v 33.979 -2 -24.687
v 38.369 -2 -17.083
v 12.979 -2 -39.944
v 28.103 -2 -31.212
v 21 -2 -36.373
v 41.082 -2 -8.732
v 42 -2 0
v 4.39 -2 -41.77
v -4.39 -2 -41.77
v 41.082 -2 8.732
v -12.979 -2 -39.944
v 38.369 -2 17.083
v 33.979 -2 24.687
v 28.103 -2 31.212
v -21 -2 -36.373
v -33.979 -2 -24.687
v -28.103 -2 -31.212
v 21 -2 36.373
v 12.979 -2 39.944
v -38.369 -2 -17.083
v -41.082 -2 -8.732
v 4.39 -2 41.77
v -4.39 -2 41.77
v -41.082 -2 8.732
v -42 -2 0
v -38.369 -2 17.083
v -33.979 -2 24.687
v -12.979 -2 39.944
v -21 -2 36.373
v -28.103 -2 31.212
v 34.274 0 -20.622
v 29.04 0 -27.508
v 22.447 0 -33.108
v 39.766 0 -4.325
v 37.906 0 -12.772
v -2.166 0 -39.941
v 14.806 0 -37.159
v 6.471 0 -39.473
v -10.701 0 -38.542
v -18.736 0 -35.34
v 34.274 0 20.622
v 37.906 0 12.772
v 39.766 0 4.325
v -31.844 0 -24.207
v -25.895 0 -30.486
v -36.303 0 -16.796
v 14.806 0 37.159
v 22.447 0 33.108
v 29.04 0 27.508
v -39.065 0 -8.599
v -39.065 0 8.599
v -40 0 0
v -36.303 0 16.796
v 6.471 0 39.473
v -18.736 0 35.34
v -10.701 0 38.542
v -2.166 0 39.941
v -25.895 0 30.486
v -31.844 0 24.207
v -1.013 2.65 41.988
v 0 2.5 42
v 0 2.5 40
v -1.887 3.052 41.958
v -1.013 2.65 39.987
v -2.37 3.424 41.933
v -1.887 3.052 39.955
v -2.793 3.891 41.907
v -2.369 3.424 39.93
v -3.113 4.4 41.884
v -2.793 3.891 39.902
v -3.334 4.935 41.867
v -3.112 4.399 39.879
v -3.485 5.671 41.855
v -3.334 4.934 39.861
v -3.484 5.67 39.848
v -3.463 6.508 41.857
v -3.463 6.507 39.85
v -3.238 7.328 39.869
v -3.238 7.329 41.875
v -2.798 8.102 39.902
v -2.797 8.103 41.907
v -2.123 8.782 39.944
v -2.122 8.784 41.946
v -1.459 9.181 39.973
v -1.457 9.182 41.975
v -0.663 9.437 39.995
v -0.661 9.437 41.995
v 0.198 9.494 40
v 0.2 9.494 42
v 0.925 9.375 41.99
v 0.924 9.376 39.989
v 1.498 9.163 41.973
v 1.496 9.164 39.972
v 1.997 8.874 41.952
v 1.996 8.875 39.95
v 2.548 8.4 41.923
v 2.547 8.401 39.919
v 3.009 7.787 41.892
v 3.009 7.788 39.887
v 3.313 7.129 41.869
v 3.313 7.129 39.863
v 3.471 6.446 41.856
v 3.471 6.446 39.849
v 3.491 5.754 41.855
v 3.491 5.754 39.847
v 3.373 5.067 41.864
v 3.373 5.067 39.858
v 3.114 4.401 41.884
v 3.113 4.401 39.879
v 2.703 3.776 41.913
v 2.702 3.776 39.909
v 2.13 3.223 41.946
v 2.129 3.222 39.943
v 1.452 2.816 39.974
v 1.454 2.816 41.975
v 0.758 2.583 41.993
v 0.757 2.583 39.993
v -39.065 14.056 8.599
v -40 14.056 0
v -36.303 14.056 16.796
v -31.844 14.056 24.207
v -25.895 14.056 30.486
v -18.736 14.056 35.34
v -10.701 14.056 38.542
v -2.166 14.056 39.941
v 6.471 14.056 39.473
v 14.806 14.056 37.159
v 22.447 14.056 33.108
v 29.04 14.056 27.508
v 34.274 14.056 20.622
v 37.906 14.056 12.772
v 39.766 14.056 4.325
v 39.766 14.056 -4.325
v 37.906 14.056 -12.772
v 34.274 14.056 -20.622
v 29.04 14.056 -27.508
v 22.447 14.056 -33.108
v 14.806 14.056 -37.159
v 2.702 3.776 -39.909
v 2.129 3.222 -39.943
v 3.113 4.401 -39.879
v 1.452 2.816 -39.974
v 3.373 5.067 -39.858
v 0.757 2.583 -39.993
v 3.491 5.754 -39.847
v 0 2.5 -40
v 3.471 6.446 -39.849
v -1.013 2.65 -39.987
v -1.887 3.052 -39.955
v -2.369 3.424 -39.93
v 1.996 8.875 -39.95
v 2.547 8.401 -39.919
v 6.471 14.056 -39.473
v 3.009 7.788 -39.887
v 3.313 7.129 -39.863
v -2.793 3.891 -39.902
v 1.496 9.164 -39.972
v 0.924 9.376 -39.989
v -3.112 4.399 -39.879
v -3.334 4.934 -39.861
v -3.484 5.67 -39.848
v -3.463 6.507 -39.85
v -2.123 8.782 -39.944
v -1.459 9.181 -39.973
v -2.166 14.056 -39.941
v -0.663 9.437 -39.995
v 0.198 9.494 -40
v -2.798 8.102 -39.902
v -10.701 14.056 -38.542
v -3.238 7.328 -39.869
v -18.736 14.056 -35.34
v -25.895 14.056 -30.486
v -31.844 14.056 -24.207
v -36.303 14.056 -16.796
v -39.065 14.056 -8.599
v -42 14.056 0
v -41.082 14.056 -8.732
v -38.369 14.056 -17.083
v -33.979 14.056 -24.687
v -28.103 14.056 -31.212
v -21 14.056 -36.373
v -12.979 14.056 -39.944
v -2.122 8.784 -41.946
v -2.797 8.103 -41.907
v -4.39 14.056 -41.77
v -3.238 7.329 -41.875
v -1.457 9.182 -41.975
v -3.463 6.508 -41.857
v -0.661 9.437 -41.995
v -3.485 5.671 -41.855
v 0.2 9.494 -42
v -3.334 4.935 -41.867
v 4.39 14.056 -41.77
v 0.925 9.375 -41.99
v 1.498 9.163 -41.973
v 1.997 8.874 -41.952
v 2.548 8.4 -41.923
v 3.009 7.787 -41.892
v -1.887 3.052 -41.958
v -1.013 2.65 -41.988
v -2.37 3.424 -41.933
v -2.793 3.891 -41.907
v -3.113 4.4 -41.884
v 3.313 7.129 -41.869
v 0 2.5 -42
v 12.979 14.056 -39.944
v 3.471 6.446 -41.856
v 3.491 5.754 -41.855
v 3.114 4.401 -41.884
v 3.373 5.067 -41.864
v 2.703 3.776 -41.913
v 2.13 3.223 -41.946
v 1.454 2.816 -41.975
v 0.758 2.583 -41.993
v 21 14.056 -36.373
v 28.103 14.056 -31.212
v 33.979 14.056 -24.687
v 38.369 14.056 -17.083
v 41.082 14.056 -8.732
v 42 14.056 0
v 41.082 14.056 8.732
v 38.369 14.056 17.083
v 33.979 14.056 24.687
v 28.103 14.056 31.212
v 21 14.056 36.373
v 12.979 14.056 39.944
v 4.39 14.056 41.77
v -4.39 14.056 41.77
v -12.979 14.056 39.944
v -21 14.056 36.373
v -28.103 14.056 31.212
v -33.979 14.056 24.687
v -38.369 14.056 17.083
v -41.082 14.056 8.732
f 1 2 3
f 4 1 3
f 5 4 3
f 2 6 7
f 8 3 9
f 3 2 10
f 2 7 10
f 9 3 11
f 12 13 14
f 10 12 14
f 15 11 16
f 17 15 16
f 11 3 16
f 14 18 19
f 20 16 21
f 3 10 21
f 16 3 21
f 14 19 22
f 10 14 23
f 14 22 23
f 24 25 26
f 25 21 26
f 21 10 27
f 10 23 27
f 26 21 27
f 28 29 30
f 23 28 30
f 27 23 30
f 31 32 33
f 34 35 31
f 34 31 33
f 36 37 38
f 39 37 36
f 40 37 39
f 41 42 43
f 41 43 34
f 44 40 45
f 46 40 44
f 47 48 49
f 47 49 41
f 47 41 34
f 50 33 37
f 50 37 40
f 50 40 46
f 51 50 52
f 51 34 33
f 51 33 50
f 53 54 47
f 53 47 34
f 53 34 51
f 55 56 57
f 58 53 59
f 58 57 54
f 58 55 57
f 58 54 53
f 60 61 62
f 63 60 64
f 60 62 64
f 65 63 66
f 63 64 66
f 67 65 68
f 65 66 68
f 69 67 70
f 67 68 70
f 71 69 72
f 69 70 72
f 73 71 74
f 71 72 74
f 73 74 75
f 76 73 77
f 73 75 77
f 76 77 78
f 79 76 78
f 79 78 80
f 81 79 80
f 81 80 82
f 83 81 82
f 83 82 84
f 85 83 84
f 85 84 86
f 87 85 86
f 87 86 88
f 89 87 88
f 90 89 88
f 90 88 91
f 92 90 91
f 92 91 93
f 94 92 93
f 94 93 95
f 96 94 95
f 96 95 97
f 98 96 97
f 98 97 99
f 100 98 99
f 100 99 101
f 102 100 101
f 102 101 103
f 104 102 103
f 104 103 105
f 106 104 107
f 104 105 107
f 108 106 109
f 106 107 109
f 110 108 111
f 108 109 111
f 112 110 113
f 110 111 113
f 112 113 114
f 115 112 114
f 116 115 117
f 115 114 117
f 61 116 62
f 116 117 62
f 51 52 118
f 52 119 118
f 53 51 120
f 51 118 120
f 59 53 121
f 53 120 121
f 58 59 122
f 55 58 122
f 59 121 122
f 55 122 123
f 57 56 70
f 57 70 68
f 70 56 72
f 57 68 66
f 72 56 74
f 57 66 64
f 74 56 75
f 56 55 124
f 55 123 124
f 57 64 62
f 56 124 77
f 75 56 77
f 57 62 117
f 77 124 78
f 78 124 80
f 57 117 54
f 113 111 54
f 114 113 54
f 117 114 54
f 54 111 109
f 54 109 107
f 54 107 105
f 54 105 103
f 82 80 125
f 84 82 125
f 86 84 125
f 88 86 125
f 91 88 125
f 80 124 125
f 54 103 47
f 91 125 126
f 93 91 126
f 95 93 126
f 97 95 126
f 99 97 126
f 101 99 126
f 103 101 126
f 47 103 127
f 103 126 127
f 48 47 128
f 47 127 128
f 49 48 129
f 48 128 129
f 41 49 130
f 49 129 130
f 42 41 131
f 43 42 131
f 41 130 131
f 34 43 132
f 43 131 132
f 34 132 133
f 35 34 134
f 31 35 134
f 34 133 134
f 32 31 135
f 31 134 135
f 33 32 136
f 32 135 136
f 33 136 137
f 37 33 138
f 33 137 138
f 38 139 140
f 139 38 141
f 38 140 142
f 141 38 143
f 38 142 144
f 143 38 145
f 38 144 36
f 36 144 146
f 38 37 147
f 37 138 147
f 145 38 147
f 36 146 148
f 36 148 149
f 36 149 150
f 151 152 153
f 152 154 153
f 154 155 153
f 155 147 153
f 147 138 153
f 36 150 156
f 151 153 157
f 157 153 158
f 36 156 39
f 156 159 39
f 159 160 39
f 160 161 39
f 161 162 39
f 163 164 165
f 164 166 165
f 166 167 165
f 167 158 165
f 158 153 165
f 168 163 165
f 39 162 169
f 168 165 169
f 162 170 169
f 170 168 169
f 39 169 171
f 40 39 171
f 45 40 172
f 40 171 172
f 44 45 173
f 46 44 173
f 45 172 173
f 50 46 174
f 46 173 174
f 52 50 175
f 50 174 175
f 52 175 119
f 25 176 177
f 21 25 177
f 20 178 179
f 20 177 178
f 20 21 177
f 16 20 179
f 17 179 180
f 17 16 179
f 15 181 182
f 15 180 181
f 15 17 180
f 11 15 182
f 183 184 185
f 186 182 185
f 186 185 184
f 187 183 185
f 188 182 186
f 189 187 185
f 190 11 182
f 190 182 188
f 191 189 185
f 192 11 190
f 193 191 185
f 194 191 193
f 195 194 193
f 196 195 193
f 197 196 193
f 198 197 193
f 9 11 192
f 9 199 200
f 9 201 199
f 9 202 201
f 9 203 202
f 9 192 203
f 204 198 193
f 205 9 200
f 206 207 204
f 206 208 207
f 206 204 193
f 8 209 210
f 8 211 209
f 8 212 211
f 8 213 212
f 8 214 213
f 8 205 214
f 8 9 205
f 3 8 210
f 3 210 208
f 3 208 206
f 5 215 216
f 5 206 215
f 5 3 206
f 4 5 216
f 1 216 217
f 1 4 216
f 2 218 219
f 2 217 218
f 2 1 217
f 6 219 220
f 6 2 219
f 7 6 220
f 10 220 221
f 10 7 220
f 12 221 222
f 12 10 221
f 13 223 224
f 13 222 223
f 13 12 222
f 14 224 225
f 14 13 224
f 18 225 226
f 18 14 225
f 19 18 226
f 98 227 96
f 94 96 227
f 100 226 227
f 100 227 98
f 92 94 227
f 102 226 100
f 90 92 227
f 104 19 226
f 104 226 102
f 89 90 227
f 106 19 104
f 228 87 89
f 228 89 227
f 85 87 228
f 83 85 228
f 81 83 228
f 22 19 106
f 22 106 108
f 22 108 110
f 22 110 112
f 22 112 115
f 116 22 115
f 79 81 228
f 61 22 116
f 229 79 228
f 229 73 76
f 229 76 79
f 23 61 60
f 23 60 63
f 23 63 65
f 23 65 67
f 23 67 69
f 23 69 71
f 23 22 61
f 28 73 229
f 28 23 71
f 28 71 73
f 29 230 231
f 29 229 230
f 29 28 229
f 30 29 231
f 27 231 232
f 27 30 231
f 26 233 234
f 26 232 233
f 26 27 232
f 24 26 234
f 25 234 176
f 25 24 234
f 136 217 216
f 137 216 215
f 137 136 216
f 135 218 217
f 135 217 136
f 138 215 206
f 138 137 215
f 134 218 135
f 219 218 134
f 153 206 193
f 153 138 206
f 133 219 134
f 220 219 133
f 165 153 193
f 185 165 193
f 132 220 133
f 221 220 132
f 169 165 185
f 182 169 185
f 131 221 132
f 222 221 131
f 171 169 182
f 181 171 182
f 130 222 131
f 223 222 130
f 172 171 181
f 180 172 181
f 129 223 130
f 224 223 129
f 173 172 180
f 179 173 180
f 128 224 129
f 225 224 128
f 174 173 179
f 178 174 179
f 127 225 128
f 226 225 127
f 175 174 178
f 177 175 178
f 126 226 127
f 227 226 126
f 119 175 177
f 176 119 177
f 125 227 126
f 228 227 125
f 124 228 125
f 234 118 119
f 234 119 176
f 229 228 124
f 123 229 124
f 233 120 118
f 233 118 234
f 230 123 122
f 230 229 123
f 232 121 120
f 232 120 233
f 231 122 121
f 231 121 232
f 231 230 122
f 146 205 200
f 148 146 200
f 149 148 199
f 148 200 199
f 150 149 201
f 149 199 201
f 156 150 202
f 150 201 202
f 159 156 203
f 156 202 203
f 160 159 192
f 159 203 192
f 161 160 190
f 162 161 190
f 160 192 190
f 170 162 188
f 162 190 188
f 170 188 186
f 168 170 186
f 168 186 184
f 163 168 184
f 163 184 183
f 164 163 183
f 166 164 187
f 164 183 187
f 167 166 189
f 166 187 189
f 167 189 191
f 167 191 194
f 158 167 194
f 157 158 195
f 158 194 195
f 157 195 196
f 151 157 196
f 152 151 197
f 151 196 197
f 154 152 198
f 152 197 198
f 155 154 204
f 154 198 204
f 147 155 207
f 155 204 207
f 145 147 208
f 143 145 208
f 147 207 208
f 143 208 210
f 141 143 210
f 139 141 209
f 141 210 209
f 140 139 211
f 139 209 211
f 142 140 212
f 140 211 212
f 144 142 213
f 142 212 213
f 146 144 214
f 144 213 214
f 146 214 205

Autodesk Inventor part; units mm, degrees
ref_plane "YZ Plane" through (0, 0, 0) normal (1, 0, 0) x (0, 1, 0)
ref_plane "XZ Plane" through (0, 0, 0) normal (0, 1, 0) x (-1, 0, 0)
ref_plane "XY Plane" through (0, 0, 0) normal (0, 0, 1) x (1, 0, 0)
sketch "Sketch1" plane through (0, 0, 0) normal (0, 0, 1) x (1, 0, 0)
  line L0 (-40, 0) -> (-40, 14.0559)
  line L1 (-42, 14.0559) -> (-42, -2)
  line L2 (-40, 0) -> (0, 0)
  line L3 (0, 0) -> (0, -2)
  line L4 (0, -2) -> (-42, -2)
  line L5 (0, -5.2112) -> (0, 17.2671) projected
  line L6 (-42, 14.0559) -> (-40, 14.0559)
  dimension "d5" = 2
  dimension "radius" = 40
  dimension "d7" = 2
revolve "Revolution1" add sketch "Sketch1" angle 360 about axis through (0, -10, 0) along (0, 1, 0)
sketch "Sketch4" plane through (0, 0, 0) normal (0, 0, 1) x (1, 0, 0)
  line L0 (40.24, 12) -> (-40.24, 12) projected
  line L1 (0, 0) -> (0, 6)
  line L2 (0, 6) -> (0, 12)
hole "Hole3" at (0, 6, 0) direction (0, 0, -1) diameter 7 end through all both
equation "\"d30\" = PenetrationUpstreamInnerDiameter + 2 * PenetrationUpstreamThickness"
equation "\"d5\" = thickness"
equation "\"radius\" = 0.5 * SaltDiameter"
equation "\"d7\" = thickness"
equation "\"thickness\" = crucible_thickness"
equation "\"CrucibleHeightBelowMembrane\" = 14"
equation "\"PenetrationUpstreamInnerDiameter\" = 5"
equation "\"PenetrationUpstreamThickness\" = 1"
equation "\"SaltDiameter\" = 80"
equation "\"crucible_thickness\" = 2"
properties part number "UpstreamVolume"
